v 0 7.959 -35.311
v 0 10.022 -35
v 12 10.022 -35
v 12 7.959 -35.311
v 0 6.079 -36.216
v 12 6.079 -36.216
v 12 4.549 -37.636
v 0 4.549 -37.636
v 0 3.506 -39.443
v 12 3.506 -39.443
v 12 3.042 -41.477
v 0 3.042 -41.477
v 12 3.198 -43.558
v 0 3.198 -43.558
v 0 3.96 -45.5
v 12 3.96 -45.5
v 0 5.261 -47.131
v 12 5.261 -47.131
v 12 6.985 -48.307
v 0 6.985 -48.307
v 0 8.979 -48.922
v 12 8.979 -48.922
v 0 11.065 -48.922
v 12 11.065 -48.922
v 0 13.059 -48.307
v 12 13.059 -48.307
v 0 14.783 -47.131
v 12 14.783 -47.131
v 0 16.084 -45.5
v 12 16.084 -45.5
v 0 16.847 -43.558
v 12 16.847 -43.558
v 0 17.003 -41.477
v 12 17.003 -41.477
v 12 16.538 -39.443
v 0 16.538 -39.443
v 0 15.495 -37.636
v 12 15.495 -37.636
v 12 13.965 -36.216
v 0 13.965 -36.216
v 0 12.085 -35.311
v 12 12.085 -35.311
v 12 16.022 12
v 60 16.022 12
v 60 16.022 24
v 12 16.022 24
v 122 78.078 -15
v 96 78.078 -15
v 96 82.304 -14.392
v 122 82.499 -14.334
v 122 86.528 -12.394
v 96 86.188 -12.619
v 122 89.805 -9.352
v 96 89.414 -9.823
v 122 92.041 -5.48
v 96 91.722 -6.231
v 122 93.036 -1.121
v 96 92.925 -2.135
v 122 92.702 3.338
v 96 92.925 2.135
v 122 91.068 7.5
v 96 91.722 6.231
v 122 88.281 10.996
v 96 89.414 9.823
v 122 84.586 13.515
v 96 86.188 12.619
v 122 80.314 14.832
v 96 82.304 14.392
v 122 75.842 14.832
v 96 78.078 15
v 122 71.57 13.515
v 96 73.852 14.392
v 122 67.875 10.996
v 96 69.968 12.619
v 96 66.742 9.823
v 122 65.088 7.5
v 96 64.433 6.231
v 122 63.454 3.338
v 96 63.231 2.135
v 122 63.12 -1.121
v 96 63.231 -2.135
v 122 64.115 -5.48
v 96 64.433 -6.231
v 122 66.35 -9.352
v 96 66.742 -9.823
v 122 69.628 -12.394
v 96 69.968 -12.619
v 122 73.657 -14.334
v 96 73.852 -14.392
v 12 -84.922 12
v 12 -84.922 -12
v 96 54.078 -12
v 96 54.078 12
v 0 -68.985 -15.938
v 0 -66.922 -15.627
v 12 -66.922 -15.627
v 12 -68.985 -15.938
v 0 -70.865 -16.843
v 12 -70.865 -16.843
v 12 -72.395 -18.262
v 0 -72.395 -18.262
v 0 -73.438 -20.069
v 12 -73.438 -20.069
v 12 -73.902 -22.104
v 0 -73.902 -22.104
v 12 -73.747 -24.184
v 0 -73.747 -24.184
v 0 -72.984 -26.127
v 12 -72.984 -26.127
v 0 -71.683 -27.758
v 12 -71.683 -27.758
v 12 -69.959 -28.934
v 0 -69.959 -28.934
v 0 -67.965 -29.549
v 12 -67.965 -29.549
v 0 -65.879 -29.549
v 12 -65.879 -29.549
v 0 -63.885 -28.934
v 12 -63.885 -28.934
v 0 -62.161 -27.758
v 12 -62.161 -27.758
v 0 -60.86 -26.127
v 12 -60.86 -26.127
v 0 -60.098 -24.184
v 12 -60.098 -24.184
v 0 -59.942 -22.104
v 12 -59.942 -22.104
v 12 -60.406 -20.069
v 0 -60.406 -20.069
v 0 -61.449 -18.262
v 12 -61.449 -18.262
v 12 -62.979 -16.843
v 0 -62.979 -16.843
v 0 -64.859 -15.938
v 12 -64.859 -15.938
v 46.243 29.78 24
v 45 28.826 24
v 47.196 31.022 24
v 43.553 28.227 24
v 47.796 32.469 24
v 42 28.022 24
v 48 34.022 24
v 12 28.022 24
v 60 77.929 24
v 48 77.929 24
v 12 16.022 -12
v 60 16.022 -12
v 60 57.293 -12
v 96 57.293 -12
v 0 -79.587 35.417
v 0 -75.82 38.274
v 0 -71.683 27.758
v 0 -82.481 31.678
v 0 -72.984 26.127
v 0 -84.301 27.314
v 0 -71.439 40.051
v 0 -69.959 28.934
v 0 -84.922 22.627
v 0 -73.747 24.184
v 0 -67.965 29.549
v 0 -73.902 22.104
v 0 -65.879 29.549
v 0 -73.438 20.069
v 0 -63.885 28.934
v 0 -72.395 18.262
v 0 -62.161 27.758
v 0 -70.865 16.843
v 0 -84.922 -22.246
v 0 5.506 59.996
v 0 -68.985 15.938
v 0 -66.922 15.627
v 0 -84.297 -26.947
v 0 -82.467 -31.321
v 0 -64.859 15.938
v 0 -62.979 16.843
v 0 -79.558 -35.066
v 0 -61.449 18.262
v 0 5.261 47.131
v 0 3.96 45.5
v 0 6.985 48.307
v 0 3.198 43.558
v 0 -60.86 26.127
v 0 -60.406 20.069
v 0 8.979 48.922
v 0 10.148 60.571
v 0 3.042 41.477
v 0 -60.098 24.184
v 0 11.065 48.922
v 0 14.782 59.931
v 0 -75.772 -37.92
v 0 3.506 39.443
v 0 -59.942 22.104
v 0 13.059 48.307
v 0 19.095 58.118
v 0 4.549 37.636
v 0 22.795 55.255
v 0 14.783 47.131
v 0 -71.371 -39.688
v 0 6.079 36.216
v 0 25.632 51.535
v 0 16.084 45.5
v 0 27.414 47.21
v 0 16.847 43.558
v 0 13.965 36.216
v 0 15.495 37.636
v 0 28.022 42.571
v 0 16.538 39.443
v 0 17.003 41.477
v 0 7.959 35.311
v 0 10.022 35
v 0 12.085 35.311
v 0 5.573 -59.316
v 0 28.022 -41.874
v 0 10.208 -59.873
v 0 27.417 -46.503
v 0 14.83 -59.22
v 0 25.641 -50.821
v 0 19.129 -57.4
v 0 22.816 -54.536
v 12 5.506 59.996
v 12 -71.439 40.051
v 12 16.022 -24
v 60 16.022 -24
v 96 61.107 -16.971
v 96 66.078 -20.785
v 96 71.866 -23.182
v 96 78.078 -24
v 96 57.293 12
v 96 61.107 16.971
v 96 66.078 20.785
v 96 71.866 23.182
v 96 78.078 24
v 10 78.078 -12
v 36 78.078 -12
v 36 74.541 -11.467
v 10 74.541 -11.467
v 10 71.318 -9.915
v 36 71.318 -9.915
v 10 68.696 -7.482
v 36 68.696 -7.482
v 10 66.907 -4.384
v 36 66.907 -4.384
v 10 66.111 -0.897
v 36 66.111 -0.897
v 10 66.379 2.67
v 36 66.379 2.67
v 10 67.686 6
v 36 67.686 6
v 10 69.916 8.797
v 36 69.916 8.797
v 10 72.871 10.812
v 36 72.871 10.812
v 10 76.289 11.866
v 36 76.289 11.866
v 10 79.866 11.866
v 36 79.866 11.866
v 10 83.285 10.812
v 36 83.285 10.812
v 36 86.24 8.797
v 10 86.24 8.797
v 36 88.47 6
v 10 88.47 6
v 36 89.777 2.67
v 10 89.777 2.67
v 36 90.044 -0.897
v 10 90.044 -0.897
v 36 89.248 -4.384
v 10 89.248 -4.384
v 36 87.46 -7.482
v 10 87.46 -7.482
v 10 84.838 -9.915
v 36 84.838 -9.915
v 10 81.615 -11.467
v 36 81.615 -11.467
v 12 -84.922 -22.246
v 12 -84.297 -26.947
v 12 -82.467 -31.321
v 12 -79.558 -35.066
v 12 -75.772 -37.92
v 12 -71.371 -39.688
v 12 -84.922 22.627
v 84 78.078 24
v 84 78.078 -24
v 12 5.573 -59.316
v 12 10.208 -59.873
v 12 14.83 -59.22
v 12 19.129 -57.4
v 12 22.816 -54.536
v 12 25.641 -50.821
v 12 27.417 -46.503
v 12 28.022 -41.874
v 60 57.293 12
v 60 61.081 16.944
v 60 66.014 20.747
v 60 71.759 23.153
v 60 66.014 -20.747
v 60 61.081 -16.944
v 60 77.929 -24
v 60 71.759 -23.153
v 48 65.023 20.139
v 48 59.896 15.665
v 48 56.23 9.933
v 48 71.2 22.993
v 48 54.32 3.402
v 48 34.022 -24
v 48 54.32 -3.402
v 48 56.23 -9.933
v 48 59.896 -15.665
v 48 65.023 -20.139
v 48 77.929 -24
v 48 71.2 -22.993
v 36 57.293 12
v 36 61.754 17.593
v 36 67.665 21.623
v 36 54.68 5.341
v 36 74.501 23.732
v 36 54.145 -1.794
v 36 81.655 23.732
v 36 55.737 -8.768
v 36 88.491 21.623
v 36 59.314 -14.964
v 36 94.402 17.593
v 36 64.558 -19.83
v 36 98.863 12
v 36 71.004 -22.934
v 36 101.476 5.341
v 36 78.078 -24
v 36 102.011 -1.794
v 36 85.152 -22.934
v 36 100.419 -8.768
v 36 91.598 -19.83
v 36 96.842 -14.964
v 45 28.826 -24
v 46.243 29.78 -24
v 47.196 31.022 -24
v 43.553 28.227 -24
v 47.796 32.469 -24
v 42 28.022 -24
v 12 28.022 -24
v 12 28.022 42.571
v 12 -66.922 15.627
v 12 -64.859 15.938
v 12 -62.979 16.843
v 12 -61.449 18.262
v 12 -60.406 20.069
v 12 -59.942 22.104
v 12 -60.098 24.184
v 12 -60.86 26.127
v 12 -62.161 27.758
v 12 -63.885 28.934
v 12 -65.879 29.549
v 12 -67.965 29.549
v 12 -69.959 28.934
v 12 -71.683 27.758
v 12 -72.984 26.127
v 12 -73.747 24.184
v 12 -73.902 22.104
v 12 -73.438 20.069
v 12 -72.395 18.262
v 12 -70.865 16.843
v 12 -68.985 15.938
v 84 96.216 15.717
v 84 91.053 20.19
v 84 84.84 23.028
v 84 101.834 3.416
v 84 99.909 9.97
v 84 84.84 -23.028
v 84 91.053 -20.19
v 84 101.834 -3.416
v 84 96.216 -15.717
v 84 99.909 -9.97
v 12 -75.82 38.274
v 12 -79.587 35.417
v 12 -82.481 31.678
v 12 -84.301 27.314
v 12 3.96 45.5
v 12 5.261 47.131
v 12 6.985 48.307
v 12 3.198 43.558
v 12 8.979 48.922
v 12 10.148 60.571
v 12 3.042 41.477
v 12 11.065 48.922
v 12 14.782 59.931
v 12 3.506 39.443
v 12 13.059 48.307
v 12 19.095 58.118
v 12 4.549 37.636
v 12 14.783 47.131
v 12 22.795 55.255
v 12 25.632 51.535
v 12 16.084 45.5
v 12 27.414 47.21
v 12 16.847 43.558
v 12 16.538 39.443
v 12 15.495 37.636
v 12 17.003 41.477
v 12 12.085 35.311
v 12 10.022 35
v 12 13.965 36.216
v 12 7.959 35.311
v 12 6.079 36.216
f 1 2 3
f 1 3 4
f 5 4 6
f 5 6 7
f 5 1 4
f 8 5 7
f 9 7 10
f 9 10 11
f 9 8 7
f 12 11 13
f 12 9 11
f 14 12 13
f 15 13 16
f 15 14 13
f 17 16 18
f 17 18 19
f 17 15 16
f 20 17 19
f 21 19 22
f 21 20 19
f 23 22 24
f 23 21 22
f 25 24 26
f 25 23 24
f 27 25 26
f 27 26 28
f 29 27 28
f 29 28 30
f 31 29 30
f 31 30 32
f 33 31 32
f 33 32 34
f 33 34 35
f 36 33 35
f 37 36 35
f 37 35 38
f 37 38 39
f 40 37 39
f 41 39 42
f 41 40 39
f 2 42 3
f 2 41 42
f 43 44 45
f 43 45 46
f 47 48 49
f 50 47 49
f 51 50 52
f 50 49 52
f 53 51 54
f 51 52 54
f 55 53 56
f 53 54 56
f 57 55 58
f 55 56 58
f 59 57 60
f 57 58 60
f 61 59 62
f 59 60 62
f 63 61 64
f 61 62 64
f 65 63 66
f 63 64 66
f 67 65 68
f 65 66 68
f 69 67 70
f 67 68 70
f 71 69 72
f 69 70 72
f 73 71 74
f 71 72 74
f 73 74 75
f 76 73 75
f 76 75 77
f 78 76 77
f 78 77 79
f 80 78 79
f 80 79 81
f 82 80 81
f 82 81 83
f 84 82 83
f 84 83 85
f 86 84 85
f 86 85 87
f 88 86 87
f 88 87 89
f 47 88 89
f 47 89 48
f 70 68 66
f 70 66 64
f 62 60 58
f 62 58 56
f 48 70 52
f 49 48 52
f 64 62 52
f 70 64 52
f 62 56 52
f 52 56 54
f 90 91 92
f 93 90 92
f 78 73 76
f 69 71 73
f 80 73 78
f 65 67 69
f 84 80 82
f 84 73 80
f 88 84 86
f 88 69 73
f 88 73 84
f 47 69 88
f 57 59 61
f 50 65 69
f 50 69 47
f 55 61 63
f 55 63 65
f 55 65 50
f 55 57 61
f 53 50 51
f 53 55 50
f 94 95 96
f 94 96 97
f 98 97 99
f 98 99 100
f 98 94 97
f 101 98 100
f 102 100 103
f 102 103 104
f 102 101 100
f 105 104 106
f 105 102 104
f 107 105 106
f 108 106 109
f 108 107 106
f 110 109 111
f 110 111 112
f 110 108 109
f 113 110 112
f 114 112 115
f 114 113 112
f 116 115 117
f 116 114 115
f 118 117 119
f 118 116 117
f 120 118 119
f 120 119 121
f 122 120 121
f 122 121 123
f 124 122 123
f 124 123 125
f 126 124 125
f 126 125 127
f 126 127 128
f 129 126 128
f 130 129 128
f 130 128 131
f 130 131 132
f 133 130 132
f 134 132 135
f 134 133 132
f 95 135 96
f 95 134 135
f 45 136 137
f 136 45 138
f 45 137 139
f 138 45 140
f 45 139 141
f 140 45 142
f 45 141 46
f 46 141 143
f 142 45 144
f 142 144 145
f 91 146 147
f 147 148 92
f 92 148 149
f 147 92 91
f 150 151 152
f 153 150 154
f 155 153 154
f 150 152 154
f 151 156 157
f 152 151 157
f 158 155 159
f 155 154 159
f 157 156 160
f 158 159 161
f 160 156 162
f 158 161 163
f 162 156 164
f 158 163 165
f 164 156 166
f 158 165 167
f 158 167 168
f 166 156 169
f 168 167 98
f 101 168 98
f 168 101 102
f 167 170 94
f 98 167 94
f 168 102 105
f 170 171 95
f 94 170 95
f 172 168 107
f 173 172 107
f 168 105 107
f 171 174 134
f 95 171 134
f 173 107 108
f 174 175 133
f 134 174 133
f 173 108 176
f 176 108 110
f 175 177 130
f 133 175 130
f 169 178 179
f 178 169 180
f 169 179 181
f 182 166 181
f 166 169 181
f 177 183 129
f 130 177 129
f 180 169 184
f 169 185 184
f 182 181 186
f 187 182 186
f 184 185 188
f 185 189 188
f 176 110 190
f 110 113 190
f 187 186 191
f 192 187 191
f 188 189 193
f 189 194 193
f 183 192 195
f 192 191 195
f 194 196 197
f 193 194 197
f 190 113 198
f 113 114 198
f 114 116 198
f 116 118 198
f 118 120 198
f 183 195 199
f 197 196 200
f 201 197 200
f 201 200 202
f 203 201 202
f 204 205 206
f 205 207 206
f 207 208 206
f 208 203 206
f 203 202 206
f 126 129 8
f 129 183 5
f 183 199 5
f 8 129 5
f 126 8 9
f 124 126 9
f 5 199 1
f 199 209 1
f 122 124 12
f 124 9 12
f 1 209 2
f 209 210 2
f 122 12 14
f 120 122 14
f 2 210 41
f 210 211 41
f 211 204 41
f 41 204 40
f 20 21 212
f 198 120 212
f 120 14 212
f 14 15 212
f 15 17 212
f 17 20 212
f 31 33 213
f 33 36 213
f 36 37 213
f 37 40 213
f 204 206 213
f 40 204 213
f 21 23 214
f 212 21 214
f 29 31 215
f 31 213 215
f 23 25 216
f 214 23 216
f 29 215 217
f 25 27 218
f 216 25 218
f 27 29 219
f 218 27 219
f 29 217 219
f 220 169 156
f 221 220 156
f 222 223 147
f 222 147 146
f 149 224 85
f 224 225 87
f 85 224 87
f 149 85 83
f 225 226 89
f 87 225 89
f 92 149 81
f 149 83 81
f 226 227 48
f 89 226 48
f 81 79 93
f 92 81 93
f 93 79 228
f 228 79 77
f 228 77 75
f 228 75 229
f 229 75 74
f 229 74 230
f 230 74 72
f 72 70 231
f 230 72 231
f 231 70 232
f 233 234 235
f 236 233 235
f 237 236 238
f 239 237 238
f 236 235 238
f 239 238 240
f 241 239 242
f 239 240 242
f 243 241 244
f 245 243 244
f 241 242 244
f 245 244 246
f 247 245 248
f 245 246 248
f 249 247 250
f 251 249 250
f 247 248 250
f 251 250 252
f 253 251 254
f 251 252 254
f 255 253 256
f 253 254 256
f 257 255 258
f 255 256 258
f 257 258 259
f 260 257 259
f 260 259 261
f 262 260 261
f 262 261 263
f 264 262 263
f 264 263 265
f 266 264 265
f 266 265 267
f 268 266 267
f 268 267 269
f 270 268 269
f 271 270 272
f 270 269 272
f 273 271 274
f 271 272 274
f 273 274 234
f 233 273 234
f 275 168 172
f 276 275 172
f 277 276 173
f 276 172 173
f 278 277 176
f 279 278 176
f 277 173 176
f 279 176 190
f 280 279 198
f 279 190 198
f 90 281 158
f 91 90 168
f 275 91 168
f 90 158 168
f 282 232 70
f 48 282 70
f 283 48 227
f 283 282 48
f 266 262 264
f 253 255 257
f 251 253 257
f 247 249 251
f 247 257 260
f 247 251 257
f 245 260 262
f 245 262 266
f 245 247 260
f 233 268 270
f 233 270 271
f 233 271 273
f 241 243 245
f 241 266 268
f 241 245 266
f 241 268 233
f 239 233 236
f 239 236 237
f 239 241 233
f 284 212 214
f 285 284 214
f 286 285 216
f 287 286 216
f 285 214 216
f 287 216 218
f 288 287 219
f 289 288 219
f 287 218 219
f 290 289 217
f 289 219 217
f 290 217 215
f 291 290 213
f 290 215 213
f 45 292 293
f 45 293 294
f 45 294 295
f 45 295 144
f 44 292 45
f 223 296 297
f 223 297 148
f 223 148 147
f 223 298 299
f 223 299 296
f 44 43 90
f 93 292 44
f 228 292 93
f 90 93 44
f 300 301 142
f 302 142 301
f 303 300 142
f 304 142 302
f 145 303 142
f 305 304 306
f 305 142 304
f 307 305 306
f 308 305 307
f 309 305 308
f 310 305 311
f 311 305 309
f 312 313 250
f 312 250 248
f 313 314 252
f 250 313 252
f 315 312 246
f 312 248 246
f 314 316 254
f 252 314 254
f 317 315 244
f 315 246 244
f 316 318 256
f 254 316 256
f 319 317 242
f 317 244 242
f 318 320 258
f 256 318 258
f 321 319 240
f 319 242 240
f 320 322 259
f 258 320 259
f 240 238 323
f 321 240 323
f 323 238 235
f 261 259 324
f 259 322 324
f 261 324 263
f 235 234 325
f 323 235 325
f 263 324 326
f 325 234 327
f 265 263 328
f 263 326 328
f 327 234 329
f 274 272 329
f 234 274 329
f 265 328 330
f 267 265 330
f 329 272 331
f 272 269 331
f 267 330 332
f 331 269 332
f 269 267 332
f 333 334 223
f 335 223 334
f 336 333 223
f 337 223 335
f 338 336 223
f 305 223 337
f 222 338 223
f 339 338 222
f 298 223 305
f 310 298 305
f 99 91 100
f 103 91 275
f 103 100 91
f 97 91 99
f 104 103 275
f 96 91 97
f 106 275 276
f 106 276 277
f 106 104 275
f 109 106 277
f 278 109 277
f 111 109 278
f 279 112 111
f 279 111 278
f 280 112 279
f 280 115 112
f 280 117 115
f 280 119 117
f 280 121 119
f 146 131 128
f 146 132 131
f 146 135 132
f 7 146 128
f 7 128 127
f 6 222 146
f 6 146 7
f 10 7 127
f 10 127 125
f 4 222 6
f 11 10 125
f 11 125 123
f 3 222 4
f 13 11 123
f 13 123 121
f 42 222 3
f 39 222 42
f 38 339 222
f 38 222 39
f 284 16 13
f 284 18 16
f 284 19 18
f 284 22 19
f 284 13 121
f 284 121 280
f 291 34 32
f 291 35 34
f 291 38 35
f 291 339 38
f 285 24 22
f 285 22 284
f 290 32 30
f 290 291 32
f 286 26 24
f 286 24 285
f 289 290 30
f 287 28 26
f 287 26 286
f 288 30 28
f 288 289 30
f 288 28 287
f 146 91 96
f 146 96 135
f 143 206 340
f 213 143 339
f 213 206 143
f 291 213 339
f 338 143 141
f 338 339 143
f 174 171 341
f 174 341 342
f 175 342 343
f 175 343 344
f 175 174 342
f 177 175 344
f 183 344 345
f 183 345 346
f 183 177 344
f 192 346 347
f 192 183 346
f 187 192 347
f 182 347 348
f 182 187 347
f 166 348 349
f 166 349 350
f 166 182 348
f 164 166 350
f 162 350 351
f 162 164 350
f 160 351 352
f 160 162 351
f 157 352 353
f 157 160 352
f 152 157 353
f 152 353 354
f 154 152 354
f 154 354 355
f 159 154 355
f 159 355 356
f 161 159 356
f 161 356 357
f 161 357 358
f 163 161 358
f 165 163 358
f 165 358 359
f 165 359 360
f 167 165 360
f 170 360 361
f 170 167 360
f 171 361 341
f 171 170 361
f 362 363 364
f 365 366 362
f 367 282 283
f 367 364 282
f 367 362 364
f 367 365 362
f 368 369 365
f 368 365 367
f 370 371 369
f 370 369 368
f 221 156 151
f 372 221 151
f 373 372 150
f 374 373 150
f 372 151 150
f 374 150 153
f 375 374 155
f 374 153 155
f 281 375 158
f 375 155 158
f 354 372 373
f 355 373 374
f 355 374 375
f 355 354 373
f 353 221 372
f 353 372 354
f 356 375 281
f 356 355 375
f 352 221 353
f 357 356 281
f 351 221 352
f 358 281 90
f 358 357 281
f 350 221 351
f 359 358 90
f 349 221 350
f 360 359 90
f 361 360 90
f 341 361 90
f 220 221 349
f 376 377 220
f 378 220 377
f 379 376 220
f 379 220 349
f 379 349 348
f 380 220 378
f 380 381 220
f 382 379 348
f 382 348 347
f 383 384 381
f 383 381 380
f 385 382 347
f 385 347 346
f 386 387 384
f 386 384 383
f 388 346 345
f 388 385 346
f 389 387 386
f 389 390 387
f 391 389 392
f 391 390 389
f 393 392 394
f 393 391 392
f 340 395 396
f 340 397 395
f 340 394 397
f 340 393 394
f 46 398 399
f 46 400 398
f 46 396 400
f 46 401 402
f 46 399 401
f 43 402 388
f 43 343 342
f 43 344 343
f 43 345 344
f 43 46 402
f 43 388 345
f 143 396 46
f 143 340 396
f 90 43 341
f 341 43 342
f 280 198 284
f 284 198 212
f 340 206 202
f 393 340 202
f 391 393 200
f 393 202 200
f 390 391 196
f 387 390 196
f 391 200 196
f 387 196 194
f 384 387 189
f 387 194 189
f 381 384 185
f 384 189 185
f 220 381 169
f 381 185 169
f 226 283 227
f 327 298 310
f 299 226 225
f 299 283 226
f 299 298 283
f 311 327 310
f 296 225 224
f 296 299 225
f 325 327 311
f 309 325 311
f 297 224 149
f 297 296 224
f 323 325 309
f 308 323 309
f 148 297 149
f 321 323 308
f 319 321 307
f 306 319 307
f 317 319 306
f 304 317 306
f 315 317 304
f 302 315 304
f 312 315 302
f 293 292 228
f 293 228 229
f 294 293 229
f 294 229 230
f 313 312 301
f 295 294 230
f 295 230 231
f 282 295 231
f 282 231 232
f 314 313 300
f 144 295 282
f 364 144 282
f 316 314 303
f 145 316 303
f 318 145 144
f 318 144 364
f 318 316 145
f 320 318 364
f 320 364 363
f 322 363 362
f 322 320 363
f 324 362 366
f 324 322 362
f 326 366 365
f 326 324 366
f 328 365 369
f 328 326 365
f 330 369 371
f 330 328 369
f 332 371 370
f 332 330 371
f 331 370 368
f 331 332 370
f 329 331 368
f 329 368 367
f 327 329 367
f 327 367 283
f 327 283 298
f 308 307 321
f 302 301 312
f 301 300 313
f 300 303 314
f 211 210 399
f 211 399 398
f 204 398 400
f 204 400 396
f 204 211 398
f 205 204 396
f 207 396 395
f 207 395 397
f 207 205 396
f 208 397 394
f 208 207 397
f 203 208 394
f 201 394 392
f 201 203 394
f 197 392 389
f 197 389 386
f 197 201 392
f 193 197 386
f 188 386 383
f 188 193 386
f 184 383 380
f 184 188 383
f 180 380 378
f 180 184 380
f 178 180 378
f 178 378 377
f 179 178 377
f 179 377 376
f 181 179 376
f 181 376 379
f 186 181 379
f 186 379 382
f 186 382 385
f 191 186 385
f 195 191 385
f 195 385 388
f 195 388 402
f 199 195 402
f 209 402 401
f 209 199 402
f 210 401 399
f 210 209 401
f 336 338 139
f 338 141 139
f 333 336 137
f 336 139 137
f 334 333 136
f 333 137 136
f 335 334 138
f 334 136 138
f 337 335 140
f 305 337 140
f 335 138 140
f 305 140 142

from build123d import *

# Parameters (mm, degrees)
SKETCH1_R                = 7
BOSS_EXTRUDE1_DEPTH      = 12
SKETCH2_R                = 24
BOSS_EXTRUDE2_DEPTH      = 48
BOSS_EXTRUDE3_DEPTH      = 12
SKETCH4_R                = 15
BOSS_EXTRUDE4_DEPTH      = 26
SKETCH5_R                = 12
BOSS_EXTRUDE5_DEPTH      = 26
BOSS_EXTRUDE6_DEPTH      = 24
BOSS_EXTRUDE6_DEPTH_BACK = 24
FILLET2_R                = 6
BOSS_EXTRUDE8_DEPTH      = 12
BOSS_EXTRUDE8_DEPTH_BACK = 12


with BuildPart() as part:
    # Sketch1 → Boss-Extrude1 (new body)
    with BuildSketch(Plane(origin=(0, 0, 0), x_dir=(0, 0, -1), z_dir=(1, 0, 0))):
        with BuildLine():
            Line((-59.995604766, 5.505634955), (-40.05091289, -71.438574032))
            ThreePointArc((-40.05091289, -71.438574032), (-33.642720476, -81.157532712), (-22.626759324, -84.92206293))
            Line((-22.626759324, -84.92206293), (22.246130308, -84.92206293))
            ThreePointArc((22.246130308, -84.92206293), (33.289539949, -81.136249628), (39.687584355, -71.371296652))
            Line((39.687584355, -71.371296652), (59.315693821, 5.572912335))
            ThreePointArc((59.315693821, 5.572912335), (56.088426472, 21.065555698), (41.874239774, 28.022146056))
            Line((41.874239774, 28.022146056), (-42.571451201, 28.022146056))
            ThreePointArc((-42.571451201, 28.022146056), (-56.806920983, 21.038107208), (-59.995604766, 5.505634955))
        make_face()
        with Locations((-42, 10.022146056)):
            Circle(SKETCH1_R, mode=Mode.SUBTRACT)
        with Locations((-22.626759324, -66.92206293)):
            Circle(SKETCH1_R, mode=Mode.SUBTRACT)
        with Locations((42, 10.022146056)):
            Circle(SKETCH1_R, mode=Mode.SUBTRACT)
        with Locations((22.626759324, -66.92206293)):
            Circle(SKETCH1_R, mode=Mode.SUBTRACT)
    extrude(amount=BOSS_EXTRUDE1_DEPTH)



with BuildPart() as body_2:
    # Sketch2 → Boss-Extrude2 (new body)
    with BuildSketch(Plane(origin=(36, 0, 0), x_dir=(0, 0, -1), z_dir=(1, 0, 0))):
        with Locations((0, 78.07793707)):
            Circle(SKETCH2_R)
    extrude(amount=BOSS_EXTRUDE2_DEPTH)

    # Sketch3 → Boss-Extrude3 (add)
    with BuildSketch(Plane(origin=(84, 0, 0), x_dir=(0, 0, -1), z_dir=(1, 0, 0))):
        with BuildLine():
            Line((-24, 78.07793707), (24, 78.07793707))
            ThreePointArc((24, 78.07793707), (0, 54.07793707), (-24, 78.07793707))
        make_face()
    extrude(amount=BOSS_EXTRUDE3_DEPTH)

    # Sketch4 → Boss-Extrude4 (add)
    with BuildSketch(Plane(origin=(96, 0, 0), x_dir=(0, 0, -1), z_dir=(1, 0, 0))):
        with Locations((0, 78.07793707)):
            Circle(SKETCH4_R)
    extrude(amount=BOSS_EXTRUDE4_DEPTH)

    # Sketch5 → Boss-Extrude5 (add)
    with BuildSketch(Plane.ZY.offset(-36)):
        with Locations((0, 78.07793707)):
            Circle(SKETCH5_R)
    extrude(amount=BOSS_EXTRUDE5_DEPTH)


with BuildPart() as part_1:
    add(part.part)

    add(body_2.part)  # Boss-Extrude6 merges body 2
    # Sketch6 → Boss-Extrude6 (add, two sides: drawn at the far end of the back side and taken through both)
    with BuildSketch(Plane.XY.offset(-BOSS_EXTRUDE6_DEPTH_BACK)):
        Polygon((12, 28.022146056), (48, 28.022146056), (48, 77.929166674), (60, 77.929166674), (60, 16.022146056), (12, 16.022146056), align=None)
    extrude(amount=BOSS_EXTRUDE6_DEPTH + BOSS_EXTRUDE6_DEPTH_BACK)

    # Fillet2
    fillet2_edges = [part_1.edges().sort_by_distance(p)[0] for p in [
        (48, 28.022146056, 0),
    ]]
    fillet(fillet2_edges, radius=FILLET2_R)

    # Sketch8 → Boss-Extrude8 (add, two sides: drawn at the far end of the back side and taken through both)
    with BuildSketch(Plane.XY.offset(-BOSS_EXTRUDE8_DEPTH_BACK)):
        Polygon((54, 16.022146056), (12, 16.022146056), (12, 5.505634955), (12, -84.92206293), (96, 54.07793707), (96, 78.07793707), (60, 77.929166674), (60, 54.07793707), (60, 22.022146056), (60, 16.022146056), align=None)
    extrude(amount=BOSS_EXTRUDE8_DEPTH + BOSS_EXTRUDE8_DEPTH_BACK)


solid = part_1.part
